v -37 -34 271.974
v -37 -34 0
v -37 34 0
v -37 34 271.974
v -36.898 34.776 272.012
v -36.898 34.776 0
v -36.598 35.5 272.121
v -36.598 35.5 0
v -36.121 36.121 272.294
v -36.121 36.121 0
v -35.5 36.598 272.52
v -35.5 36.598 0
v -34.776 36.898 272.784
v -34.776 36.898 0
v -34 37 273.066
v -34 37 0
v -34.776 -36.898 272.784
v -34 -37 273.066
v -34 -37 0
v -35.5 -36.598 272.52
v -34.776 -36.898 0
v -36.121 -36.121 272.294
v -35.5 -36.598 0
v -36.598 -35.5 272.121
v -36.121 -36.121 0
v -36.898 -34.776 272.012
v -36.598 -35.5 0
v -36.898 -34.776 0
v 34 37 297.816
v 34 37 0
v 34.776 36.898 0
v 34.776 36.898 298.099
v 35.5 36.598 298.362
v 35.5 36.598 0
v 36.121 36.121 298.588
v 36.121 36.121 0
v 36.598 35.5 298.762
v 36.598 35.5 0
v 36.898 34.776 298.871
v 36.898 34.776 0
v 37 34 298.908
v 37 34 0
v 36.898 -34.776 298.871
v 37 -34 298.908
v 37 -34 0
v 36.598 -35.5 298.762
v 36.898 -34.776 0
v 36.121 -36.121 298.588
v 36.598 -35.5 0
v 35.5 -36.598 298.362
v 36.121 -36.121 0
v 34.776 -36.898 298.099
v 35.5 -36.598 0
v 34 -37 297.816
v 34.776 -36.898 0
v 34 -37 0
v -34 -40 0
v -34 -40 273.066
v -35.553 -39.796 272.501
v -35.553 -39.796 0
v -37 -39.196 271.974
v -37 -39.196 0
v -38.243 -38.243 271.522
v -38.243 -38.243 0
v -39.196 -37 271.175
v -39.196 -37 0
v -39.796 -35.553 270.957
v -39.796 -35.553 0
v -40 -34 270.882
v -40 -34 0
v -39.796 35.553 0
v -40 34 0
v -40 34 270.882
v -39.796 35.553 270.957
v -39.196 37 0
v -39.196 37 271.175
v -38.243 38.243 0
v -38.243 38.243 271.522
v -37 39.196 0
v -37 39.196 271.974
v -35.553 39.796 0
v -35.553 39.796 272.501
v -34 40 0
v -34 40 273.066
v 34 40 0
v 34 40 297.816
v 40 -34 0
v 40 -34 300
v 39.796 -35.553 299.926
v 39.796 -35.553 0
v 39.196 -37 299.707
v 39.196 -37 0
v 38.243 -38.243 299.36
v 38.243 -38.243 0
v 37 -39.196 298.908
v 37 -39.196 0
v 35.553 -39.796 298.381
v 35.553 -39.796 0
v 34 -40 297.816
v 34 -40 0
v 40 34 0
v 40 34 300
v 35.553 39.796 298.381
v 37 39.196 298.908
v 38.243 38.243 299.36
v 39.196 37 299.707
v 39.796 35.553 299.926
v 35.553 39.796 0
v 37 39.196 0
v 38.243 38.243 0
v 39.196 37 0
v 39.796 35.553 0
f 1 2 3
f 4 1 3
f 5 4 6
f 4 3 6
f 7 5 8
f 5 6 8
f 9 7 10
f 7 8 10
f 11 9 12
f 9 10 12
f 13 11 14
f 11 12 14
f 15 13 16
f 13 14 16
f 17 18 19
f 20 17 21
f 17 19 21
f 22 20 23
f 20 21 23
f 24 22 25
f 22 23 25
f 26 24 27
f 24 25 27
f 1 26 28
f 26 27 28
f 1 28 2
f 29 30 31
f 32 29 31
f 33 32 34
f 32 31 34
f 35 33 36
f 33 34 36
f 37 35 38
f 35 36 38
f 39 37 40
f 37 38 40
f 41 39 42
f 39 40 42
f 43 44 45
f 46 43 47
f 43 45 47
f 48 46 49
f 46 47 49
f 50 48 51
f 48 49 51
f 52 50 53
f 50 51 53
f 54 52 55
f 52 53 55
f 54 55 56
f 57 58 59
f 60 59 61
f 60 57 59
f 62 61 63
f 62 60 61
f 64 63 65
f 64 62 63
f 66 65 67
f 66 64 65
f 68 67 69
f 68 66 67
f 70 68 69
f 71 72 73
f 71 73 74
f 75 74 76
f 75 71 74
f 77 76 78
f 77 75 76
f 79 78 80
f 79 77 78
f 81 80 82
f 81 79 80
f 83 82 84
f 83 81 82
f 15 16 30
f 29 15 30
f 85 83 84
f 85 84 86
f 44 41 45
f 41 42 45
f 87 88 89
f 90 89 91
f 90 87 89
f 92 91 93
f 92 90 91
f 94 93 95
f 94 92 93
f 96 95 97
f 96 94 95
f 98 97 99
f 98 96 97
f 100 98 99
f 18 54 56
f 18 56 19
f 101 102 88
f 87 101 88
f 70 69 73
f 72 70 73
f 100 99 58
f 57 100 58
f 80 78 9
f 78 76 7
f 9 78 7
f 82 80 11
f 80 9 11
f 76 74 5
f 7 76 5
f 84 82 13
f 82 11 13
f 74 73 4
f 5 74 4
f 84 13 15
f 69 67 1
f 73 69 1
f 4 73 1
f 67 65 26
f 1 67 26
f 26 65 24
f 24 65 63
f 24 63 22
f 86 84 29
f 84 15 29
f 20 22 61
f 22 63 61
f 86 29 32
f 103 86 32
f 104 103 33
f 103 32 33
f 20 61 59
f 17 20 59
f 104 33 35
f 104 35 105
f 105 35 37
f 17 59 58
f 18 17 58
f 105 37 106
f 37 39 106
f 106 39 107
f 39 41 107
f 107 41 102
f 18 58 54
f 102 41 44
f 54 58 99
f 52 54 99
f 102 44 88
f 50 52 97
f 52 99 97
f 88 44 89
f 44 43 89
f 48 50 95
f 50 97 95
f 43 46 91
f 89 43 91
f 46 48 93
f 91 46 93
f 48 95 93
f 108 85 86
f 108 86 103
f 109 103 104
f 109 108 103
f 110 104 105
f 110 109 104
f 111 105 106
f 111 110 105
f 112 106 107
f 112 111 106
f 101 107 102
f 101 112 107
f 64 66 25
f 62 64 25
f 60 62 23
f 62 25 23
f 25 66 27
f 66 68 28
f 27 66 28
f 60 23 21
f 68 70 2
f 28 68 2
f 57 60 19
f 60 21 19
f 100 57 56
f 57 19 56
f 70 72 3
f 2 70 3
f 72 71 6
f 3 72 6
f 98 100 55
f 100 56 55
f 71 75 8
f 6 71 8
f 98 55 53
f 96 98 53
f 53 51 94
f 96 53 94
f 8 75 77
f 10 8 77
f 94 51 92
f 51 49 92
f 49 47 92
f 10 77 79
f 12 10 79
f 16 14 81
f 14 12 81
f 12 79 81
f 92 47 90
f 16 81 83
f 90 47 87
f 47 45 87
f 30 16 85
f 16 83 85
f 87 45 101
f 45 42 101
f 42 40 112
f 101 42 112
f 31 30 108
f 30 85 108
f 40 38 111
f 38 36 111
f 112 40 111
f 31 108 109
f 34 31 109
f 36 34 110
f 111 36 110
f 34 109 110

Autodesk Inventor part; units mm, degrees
ref_plane "YZ Plane" through (0, 0, 0) normal (1, 0, 0) x (0, 1, 0)
ref_plane "Start plane" through (0, 0, 0) normal (0, 0, 1) x (1, 0, 0)
ref_plane "End plane" through (0, 0, 1000) normal (0, 0, 1) x (1, 0, 0)
sketch "Sketch" plane through (0, 0, 0) normal (0, 0, 1) x (1, 0, 0)
  line L0 (-40, -34) -> (-40, 34)
  line L1 (-34, 40) -> (34, 40)
  line L2 (40, 34) -> (40, -34)
  line L3 (34, -40) -> (-34, -40)
  arc A0 (-40, -34) -> (-34, -40) centre (-34, -34) ccw
  arc A1 (40, 34) -> (34, 40) centre (34, 34) ccw
  arc A2 (-34, 40) -> (-40, 34) centre (-34, 34) ccw
  arc A3 (34, -40) -> (40, -34) centre (34, -34) ccw
  arc A4 (-34, 37) -> (-37, 34) centre (-34, 34) ccw
  line L4 (-34, 37) -> (34, 37)
  arc A5 (37, 34) -> (34, 37) centre (34, 34) ccw
  line L5 (37, 34) -> (37, -34)
  arc A6 (34, -37) -> (37, -34) centre (34, -34) ccw
  line L6 (34, -37) -> (-34, -37)
  arc A7 (-37, -34) -> (-34, -37) centre (-34, -34) ccw
  line L7 (-37, -34) -> (-37, 34)
  line L8 (0, 57.7397) -> (0, -57.7397) construction
  line L9 (-1453.6197, 0) -> (290.3864, 0) construction
  dimension "d7" = 6
  dimension "d9" = 80
  dimension "d11" = 80
  dimension "d12" = 3
  dimension "d15" = 40
  dimension "d16" = 40
extrude "Body" add sketch "Sketch" along normal up to surface (1000 mm away) from surface at 0
sketch "Sketch3" plane through (0, 0, 0) normal (0, 0, 1) x (1, 0, 0)
  line L0 (0, 0) -> (10, 0)
ref_plane "Work Plane3" through (0, 0, 0) normal (0, -1, 0) x (1, 0, 0)
sketch "Sketch5" plane through (0, 0, 0) normal (0, 1, 0) x (-1, 0, 0)
  line L0 (-40, 0) -> (-40, 1000) projected
  line L1 (40, 0) -> (40, 1000) projected
  line L2 (40, 0) -> (40, 1000) projected
  line L3 (40, 278.04) -> (415, 278.04) construction
  line L4 (-5.663, 299.3796) -> (835.663, 299.3796) construction
  arc A0 (-5.663, 299.3796) -> (415, 200) centre (415, 1140) ccw construction
  line L5 (-55, 379.2385) -> (885, 379.2385) construction
  arc A1 (-55, 379.2385) -> (-5.663, 299.3796) centre (34.3, 379.2385) ccw construction
  arc A2 (835.663, 299.3796) -> (885, 379.2385) centre (795.7, 379.2385) ccw
  line L6 (-55, 379.2385) -> (-55, 419.2385)
  line L7 (885, 379.2385) -> (885, 419.2385)
  line L8 (-55, 419.2385) -> (415, 419.2385) construction
  line L9 (415, 419.2385) -> (415, 0)
  arc A3 (415, 200) -> (835.663, 299.3796) centre (415, 1140) ccw
  line L10 (415, 419.2385) -> (885, 419.2385)
  point P0 (0, 0)
  dimension "d22" = 375
  dimension "d24" = 940
  dimension "d25" = 89.3
  dimension "d26" = 40
  dimension "d27" = 940
  dimension "d28" = 200
  dimension "d30" = 278.04
sketch "Sketch6" plane through (0, 0, 0) normal (0, 1, 0) x (-1, 0, 0)
  line L0 (40, 0) -> (40, 1000) projected
  line L1 (40, 0) -> (40, 1000) projected
  line L2 (-40, 0) -> (-40, 1000) projected
  line L3 (-40, 0) -> (-40, 1000) projected
  line L4 (34, 1000) -> (40, 1000) projected
  line L5 (40, 1000) -> (-40, 1000)
  arc A0 (-5.663, 299.3796) -> (415, 200) centre (415, 1140) ccw construction
  line L6 (40, 270.8824) -> (-40, 300)
  point P0 (0, 0)
  dimension "d34" = 110
  dimension "d36" = 300
extrude "Extrusion2" cut sketch "Sketch6" along normal through all both and the other way through all
sketch "Sketch4" plane through (0, 0, 0) normal (0, -1, 0) x (1, 0, 0)
  line L0 (-1453.3712, 0) -> (288.8952, 0) projected
  line L1 (-1453.3712, 1000) -> (288.8952, 1000) projected
  dimension "d18" = 1000
equation "\"d7\" = G_IR"
equation "\"d9\" = G_W"
equation "\"d11\" = G_H"
equation "\"d12\" = G_T"
equation "\"d15\" = 0.5 * d9"
equation "\"d16\" = 0.5 * d11"
equation "\"d3\" = G_L"
equation "\"d22\" = 0.5 * Diam_of_legs_center"
equation "\"d24\" = d27"
equation "\"d25\" = 0.095 * d27"
equation "\"d27\" = MAIN_filter_diam"
equation "\"G_W\" = 80"
equation "\"G_H\" = 80"
equation "\"G_T\" = 3"
equation "\"G_IR\" = 6"
equation "\"G_L\" = d18"
equation "\"G_OFFSET_START\" = 0"
equation "\"G_OFFSET_END\" = 0"
equation "\"MAIN_filter_diam\" = 940"
equation "\"Diam_of_legs_center\" = 750"
properties part number "SLM 1692 Leg tube" material "Steel, Mild"
